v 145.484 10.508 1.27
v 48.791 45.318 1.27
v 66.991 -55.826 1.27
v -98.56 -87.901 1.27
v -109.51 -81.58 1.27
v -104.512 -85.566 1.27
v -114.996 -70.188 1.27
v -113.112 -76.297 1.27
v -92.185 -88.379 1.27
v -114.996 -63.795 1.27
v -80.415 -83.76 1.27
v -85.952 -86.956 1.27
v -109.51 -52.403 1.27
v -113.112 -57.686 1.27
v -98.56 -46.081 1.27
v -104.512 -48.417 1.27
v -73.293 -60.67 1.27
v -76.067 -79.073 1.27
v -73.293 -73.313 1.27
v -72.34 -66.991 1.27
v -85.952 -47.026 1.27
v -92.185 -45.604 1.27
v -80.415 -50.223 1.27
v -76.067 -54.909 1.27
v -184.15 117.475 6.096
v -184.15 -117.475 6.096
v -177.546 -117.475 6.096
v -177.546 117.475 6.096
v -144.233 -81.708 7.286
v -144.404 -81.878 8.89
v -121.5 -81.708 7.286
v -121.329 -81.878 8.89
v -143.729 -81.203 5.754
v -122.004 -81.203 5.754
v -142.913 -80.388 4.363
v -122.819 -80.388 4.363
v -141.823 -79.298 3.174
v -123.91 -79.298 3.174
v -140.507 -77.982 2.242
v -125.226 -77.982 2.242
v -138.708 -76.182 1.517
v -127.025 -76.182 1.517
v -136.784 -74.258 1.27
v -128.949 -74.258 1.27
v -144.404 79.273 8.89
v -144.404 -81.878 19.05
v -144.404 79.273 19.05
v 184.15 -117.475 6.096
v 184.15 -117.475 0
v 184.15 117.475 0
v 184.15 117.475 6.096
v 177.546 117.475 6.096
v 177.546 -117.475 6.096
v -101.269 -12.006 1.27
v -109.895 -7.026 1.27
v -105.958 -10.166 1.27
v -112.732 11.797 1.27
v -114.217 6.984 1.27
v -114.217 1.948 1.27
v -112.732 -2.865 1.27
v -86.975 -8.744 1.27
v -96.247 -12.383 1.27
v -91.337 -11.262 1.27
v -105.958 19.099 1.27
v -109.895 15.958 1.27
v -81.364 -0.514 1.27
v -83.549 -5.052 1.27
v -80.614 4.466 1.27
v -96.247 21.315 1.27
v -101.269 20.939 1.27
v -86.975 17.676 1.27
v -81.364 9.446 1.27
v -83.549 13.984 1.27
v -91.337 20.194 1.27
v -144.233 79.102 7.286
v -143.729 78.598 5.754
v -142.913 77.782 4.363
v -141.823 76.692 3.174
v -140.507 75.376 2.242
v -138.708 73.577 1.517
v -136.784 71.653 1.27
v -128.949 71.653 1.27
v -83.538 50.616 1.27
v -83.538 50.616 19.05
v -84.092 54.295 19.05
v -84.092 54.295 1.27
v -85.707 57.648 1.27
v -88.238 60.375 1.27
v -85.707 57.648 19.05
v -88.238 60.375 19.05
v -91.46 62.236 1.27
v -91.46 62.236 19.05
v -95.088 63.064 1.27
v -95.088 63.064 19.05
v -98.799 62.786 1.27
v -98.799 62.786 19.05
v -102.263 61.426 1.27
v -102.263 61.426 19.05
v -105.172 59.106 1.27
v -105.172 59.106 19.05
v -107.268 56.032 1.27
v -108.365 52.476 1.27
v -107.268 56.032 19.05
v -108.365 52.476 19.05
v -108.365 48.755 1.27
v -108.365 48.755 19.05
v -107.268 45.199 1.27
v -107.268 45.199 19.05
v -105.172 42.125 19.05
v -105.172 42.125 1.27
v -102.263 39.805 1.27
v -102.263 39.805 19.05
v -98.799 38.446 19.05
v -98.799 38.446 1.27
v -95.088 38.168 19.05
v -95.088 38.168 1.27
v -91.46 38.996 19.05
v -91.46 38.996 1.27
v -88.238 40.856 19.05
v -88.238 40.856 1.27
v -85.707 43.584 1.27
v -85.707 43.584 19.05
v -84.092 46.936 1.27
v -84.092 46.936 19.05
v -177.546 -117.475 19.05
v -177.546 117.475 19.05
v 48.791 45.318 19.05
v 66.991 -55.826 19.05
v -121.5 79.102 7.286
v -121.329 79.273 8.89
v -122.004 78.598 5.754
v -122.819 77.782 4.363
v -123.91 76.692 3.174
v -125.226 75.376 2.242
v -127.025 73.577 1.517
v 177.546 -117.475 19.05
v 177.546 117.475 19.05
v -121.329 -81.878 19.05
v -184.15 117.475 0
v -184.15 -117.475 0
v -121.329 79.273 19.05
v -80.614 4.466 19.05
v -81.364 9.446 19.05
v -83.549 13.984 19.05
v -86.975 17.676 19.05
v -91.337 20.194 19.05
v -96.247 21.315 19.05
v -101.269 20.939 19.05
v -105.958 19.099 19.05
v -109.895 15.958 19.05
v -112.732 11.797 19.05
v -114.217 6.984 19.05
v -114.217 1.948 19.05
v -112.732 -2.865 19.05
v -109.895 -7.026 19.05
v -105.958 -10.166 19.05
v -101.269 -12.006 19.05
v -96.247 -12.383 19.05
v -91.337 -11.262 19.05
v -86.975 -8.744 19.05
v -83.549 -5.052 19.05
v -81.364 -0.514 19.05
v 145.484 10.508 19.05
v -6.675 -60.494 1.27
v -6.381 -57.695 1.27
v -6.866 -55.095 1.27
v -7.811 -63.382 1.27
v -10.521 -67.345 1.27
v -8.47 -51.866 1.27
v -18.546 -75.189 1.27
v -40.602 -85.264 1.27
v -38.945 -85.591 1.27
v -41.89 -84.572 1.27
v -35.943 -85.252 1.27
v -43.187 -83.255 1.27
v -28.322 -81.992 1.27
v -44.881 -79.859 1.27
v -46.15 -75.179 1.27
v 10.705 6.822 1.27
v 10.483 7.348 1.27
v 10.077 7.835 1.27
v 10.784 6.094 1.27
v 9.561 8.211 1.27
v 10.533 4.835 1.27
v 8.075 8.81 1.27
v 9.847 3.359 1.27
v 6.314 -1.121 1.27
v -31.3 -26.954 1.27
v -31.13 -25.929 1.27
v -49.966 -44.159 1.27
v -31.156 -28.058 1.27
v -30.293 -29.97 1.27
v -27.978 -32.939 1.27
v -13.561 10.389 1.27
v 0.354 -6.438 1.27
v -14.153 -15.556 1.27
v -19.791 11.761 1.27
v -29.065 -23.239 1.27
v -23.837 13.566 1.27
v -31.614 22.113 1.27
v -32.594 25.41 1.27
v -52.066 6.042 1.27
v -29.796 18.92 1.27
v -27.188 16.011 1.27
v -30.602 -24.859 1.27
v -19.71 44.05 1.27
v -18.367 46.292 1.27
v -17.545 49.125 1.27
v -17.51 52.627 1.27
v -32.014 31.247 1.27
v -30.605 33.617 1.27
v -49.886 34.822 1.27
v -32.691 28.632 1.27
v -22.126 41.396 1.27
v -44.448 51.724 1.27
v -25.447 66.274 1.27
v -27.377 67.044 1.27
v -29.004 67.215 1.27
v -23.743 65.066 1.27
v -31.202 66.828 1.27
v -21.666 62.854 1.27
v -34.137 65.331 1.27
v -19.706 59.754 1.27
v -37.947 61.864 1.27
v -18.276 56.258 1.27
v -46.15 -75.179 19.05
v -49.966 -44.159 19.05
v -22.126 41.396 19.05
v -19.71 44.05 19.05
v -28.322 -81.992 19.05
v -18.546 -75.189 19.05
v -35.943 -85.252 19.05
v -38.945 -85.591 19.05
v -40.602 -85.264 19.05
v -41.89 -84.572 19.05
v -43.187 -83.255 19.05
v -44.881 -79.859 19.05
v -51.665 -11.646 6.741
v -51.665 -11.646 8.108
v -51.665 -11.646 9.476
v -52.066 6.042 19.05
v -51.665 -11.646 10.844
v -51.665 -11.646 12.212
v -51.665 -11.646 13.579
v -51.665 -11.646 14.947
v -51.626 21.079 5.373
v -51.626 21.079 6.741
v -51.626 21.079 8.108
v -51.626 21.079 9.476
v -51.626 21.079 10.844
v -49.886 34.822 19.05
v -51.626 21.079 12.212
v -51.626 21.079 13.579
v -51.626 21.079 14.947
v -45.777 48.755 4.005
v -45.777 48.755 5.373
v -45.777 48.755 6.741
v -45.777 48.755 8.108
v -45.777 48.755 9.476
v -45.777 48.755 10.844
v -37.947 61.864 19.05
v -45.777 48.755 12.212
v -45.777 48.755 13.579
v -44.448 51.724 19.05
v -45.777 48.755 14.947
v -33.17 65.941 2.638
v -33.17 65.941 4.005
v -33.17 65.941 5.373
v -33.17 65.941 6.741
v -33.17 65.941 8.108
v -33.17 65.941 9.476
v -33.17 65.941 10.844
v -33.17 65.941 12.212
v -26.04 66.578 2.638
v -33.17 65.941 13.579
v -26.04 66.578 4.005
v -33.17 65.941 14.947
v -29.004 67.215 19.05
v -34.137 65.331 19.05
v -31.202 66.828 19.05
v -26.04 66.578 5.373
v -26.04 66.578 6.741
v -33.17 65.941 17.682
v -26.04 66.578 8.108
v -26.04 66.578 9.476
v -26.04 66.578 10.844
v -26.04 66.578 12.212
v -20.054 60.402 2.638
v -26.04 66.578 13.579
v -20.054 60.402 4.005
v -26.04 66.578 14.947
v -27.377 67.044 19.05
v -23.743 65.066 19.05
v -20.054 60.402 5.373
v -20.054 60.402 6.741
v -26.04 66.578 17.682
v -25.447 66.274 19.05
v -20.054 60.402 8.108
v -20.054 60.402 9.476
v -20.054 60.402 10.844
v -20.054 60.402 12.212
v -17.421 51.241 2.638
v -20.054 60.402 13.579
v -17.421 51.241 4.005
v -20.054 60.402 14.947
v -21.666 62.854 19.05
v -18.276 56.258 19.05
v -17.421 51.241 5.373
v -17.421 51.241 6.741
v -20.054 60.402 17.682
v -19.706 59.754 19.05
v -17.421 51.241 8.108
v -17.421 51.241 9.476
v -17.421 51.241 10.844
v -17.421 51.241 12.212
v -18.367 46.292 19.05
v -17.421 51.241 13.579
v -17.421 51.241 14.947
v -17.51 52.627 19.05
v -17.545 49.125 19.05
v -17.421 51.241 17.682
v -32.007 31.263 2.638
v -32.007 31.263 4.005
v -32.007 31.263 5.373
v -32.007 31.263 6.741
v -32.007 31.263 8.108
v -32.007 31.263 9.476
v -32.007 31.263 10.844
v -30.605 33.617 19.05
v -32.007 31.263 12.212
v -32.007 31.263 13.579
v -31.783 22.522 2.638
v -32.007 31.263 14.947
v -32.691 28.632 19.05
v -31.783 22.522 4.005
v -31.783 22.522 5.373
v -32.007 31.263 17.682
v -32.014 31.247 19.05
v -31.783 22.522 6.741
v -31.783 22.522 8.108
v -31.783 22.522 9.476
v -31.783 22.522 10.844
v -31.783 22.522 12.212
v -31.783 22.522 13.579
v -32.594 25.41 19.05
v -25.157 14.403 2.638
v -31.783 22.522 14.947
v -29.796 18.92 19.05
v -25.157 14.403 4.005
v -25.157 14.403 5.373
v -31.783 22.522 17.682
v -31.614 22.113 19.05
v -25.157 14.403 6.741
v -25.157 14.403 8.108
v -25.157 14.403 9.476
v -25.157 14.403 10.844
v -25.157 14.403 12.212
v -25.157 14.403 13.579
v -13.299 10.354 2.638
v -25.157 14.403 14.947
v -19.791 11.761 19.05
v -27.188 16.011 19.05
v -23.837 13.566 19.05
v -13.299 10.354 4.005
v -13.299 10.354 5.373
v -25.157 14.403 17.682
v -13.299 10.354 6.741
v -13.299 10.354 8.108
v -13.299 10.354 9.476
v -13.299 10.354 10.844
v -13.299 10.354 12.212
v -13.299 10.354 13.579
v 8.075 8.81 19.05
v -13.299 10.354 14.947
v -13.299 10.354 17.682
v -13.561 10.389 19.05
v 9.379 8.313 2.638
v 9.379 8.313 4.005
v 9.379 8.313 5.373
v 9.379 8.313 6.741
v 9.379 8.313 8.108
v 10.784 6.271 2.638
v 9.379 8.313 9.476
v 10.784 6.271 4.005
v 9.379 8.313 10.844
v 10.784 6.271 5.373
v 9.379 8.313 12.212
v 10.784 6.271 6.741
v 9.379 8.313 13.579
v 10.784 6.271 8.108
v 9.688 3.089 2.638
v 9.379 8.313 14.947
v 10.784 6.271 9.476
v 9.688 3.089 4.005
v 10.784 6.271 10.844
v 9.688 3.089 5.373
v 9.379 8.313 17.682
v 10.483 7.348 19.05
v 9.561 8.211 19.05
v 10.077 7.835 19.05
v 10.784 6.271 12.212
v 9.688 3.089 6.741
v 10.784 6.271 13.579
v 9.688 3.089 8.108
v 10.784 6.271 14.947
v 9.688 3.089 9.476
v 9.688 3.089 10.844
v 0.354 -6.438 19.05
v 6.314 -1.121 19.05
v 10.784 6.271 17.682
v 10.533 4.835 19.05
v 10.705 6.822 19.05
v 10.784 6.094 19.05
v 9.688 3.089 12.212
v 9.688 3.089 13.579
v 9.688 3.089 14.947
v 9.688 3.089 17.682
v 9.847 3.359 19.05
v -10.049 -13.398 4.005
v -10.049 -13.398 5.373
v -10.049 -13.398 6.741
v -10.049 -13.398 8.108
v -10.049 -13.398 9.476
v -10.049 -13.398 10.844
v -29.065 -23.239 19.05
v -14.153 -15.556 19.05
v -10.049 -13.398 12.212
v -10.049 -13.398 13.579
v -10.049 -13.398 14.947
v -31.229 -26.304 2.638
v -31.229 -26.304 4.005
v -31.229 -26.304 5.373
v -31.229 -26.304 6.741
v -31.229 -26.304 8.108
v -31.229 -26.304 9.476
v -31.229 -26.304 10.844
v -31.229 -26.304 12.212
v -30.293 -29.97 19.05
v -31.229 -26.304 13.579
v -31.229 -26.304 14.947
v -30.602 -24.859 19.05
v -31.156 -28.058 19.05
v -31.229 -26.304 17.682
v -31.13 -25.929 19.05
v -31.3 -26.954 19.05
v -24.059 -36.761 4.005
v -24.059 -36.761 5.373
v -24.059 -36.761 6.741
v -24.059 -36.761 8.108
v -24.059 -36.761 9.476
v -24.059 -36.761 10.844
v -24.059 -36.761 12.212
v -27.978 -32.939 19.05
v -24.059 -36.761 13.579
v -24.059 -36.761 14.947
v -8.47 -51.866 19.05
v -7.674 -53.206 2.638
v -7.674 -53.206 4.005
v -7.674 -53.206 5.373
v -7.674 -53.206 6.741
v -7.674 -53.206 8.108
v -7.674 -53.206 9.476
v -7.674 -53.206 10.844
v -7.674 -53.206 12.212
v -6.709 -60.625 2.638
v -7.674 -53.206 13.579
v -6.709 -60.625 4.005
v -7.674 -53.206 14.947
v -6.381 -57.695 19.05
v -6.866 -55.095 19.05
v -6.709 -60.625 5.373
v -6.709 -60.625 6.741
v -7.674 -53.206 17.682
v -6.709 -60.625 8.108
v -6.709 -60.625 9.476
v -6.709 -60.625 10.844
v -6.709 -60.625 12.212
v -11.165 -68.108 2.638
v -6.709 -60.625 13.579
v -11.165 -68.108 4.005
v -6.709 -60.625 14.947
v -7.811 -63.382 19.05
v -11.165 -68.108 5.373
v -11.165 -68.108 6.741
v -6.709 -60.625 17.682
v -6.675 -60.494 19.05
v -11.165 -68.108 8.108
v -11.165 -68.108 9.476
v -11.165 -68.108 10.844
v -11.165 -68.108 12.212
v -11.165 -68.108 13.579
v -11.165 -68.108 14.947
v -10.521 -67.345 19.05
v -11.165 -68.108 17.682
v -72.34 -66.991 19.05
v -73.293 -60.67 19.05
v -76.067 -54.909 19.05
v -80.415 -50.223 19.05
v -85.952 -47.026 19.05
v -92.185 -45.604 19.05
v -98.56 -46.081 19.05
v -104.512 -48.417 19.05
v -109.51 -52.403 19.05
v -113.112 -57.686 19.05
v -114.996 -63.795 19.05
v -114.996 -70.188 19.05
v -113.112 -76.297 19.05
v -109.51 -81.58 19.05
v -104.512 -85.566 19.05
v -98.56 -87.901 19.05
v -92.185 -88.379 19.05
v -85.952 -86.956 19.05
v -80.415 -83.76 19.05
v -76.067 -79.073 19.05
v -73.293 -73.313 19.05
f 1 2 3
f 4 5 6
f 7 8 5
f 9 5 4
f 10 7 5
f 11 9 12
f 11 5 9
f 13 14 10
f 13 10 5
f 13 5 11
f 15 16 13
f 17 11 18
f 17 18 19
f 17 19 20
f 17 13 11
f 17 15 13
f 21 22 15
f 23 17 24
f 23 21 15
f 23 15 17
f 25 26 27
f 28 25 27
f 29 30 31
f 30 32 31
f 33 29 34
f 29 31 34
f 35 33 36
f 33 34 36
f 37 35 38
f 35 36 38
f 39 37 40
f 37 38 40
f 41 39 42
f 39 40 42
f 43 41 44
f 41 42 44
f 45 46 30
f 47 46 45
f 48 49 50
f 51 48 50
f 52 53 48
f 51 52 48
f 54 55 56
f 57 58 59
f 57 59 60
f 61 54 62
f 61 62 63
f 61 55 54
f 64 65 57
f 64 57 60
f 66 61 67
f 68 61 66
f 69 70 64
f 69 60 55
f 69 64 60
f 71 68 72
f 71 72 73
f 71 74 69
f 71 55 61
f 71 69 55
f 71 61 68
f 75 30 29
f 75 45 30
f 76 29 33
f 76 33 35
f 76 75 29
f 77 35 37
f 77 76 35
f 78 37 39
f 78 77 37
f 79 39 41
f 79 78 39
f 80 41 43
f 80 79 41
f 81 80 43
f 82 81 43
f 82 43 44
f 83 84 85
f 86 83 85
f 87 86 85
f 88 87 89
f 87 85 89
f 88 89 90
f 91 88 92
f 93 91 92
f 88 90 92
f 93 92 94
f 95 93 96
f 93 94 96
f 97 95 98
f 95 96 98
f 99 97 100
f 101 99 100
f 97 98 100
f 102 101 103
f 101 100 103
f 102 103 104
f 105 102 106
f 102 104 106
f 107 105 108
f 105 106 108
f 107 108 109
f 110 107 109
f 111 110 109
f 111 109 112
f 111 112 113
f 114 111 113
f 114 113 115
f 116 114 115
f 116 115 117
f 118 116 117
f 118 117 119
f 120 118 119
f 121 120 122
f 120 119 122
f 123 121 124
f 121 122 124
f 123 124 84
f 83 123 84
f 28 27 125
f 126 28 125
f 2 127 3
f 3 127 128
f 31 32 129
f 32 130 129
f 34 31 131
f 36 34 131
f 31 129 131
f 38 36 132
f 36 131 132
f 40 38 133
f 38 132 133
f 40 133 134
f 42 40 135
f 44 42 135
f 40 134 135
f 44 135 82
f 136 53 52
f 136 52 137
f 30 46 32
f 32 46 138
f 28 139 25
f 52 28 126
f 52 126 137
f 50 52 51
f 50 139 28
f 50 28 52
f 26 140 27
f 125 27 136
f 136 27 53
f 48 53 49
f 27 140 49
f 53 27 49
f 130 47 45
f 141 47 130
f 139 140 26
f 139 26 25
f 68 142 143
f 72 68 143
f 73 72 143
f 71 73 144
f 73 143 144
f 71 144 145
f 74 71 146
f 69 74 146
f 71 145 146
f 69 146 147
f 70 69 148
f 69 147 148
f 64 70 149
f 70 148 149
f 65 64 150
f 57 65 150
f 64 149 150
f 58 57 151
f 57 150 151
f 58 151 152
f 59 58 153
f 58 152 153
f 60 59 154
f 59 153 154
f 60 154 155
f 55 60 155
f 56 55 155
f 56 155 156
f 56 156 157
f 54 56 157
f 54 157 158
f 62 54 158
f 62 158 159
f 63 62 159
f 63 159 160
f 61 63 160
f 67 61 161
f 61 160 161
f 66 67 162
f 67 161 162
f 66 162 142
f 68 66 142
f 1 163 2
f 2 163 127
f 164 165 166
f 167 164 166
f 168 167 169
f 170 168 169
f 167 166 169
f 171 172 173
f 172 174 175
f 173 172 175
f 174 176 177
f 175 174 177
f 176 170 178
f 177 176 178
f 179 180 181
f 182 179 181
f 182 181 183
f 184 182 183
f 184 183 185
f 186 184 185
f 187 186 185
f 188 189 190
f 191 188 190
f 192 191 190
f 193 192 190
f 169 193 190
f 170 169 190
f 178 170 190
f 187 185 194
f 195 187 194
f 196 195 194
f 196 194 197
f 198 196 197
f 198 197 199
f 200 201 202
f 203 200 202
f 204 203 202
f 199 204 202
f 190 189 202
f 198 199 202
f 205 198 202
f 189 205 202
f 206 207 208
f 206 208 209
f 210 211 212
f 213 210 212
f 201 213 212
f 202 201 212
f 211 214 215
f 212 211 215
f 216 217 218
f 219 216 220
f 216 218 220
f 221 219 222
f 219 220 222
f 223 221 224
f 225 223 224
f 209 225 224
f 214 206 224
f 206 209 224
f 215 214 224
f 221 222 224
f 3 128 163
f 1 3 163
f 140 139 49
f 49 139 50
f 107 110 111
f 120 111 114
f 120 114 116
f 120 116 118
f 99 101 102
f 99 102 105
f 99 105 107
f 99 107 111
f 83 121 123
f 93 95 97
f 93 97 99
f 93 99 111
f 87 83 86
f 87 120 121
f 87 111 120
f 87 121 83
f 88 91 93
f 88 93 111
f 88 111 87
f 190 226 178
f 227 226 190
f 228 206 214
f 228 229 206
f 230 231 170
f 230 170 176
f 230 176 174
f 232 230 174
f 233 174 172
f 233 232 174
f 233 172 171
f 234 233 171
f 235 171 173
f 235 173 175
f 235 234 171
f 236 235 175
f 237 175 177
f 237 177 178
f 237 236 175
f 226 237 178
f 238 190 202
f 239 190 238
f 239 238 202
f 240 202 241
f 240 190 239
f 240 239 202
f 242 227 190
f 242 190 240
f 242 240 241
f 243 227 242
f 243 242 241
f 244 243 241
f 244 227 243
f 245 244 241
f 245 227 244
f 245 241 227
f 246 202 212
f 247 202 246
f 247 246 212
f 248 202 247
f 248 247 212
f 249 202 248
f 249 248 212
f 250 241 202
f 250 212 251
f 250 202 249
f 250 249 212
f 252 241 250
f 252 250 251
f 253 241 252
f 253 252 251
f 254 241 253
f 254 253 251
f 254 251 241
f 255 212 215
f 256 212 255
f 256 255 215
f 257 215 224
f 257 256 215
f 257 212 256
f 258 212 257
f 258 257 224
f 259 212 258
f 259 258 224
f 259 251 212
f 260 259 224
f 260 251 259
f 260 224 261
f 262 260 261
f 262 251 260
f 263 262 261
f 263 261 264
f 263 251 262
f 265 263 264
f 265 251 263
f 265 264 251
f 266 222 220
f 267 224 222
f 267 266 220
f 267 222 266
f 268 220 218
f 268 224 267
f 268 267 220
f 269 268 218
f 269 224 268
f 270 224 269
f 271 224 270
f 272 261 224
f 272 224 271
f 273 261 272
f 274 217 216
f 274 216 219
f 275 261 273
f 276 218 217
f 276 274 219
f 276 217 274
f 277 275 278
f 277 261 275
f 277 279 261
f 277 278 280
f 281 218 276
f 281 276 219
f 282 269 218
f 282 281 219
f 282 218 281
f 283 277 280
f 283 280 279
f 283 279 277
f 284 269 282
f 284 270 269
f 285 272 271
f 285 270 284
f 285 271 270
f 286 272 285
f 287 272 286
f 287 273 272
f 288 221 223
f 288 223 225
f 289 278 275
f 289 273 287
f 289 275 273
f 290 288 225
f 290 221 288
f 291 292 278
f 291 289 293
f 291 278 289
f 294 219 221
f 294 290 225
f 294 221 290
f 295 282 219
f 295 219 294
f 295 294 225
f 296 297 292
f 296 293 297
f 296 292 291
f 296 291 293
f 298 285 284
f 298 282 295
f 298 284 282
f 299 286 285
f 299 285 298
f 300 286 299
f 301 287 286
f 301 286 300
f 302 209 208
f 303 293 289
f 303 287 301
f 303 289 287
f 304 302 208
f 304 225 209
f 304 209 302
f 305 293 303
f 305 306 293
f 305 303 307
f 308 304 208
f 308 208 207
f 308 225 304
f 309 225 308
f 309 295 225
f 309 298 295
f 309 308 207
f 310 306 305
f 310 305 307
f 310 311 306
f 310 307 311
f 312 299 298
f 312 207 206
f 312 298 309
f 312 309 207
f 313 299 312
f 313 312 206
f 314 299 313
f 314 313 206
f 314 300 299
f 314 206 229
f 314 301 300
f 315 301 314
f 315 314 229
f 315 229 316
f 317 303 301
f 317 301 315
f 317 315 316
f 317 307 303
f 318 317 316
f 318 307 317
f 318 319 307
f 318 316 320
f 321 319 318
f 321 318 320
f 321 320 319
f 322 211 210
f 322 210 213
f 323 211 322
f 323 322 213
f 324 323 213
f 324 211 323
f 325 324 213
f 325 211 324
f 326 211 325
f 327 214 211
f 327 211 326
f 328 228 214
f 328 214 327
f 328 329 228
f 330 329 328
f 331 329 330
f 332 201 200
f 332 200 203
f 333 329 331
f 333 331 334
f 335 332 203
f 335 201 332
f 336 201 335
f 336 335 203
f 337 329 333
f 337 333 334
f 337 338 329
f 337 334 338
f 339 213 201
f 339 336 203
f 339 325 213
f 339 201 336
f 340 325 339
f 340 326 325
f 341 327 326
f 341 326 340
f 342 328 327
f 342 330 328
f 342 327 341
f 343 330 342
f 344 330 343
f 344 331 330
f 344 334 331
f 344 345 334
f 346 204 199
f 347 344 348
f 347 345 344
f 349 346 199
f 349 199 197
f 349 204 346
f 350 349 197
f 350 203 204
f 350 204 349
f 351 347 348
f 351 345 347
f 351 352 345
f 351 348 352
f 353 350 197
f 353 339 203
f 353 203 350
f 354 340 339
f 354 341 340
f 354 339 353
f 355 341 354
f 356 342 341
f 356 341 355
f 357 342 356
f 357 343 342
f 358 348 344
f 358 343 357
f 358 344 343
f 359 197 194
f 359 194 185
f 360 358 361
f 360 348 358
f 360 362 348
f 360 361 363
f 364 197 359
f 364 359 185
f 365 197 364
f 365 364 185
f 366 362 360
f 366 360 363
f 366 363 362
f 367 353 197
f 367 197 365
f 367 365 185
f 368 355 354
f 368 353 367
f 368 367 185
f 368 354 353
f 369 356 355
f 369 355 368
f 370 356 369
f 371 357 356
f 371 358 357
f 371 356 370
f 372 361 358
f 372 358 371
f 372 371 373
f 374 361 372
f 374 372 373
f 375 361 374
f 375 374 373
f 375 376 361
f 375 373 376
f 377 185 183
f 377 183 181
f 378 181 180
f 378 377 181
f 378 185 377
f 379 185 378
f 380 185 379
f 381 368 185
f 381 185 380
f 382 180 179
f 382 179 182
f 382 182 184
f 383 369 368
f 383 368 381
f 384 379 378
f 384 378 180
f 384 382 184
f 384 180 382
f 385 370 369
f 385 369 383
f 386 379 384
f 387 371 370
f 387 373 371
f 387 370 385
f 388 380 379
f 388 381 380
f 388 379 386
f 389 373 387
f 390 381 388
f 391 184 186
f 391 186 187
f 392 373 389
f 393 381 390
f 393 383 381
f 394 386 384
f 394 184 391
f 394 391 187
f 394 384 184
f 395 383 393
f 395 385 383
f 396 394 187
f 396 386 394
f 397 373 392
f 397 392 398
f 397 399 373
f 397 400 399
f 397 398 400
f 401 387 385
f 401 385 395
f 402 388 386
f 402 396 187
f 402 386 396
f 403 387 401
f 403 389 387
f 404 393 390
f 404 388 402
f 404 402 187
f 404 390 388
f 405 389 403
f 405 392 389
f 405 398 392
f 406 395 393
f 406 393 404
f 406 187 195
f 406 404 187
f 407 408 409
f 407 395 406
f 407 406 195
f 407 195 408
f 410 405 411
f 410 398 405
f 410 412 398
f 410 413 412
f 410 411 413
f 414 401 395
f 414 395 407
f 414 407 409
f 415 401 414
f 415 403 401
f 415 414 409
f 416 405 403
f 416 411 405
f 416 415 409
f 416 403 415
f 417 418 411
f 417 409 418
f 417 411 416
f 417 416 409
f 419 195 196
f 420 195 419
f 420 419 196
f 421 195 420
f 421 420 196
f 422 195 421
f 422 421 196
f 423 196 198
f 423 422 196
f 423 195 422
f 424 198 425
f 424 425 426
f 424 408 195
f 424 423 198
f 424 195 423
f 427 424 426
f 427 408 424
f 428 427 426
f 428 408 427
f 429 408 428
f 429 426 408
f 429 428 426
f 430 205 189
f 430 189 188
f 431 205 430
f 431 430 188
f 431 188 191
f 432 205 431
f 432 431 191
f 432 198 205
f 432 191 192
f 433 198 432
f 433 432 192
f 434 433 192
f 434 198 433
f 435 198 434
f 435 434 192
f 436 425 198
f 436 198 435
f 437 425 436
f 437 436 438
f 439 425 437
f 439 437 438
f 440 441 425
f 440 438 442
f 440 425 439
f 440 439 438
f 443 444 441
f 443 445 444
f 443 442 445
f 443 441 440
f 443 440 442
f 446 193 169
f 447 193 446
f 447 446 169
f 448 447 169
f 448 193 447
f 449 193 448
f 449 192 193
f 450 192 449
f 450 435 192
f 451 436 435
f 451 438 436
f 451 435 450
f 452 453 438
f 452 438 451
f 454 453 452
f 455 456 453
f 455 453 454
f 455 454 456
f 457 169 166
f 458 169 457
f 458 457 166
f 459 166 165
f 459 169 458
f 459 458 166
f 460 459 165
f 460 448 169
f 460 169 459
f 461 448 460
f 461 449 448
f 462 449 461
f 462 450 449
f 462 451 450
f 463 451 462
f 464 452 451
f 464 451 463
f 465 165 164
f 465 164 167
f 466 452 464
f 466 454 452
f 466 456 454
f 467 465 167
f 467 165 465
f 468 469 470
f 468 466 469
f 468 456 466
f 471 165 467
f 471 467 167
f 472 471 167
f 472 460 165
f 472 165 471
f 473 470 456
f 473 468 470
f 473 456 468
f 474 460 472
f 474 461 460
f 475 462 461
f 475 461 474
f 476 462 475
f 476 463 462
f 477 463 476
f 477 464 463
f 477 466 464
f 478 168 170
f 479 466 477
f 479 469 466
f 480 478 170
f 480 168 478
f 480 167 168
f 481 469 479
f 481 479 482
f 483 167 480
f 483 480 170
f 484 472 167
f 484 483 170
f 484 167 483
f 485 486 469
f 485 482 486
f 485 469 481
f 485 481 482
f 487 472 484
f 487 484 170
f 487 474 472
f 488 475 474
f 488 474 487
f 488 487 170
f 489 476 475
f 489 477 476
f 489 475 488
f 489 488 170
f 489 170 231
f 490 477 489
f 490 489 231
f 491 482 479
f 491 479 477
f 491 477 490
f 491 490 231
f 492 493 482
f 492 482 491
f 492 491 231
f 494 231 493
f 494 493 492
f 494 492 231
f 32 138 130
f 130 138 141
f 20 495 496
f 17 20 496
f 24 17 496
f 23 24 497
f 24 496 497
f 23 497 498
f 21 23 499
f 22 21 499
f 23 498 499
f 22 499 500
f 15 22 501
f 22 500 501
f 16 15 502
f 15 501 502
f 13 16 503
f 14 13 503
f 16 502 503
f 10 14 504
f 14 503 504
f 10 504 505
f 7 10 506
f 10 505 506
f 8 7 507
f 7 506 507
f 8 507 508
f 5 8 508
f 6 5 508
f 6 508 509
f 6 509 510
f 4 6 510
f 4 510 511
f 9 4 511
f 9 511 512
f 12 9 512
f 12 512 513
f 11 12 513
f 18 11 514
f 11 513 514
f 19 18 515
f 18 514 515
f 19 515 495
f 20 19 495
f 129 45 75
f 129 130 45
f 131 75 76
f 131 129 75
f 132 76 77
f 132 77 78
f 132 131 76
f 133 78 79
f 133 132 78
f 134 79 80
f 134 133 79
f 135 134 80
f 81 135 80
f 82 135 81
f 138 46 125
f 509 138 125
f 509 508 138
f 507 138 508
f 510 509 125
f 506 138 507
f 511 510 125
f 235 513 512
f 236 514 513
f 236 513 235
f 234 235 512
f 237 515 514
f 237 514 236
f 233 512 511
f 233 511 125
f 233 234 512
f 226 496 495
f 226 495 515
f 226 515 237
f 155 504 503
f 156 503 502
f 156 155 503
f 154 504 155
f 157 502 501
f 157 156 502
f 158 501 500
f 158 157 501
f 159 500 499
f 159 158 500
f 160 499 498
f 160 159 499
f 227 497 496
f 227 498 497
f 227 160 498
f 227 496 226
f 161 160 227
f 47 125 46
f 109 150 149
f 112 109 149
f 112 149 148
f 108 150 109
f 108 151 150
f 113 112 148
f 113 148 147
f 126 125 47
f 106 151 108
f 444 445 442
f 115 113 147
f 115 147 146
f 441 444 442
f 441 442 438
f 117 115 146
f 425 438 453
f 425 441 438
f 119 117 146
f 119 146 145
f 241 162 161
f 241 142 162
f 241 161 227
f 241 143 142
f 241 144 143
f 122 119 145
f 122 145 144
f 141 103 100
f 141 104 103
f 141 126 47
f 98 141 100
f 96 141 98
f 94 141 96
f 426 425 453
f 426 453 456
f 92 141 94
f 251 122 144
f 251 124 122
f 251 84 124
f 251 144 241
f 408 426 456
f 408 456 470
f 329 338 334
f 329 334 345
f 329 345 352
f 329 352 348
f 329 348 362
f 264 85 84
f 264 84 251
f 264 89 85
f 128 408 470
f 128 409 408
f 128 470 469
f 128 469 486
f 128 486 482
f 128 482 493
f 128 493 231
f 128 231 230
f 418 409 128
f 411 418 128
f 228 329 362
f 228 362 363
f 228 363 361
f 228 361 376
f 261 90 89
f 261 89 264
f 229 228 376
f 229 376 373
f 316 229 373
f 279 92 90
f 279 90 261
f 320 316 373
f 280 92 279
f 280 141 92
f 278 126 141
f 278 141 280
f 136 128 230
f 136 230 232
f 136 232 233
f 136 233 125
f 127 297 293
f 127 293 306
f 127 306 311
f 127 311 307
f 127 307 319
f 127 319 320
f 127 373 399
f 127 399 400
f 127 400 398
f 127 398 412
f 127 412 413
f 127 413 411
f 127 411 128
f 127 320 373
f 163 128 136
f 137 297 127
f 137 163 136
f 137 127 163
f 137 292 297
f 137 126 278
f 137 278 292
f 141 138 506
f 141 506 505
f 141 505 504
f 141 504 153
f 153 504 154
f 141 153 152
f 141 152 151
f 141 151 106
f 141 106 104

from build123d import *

# Parameters (mm, degrees)
F0_W      = 368.3
F0_H      = 234.95
F1_DEPTH  = 19.05
F2_W      = 6.604
F2_H      = 12.954
F3_DEPTH  = 234.951
F4_R      = 16.8960598702
F4_R_2    = 21.4477044948
F4_W      = 23.0748131871
F4_H      = 161.1514985561
F4_R_3    = 12.4831112704
F5_DEPTH  = 17.78
F6_R      = 7.62
F8_DEPTH  = 101.6
F14_DEPTH = 44.45


with BuildPart() as f1:
    # F0 (on Top) → F1 (new body)
    with BuildSketch(Plane.XY):
        Rectangle(F0_W, F0_H)
    extrude(amount=F1_DEPTH)

    # F2 (on face) → F3 (cut, through all)
    with BuildSketch(Plane.XZ.offset(117.475)):
        with Locations((180.848, 12.573)):
            Rectangle(F2_W, F2_H)
        with Locations((-180.848, 12.573)):
            Rectangle(F2_W, F2_H)
    extrude(amount=-F3_DEPTH, mode=Mode.SUBTRACT)

    # F4 (on face) → F5 (cut)
    with BuildSketch(Plane.XY.offset(19.05)):
        with BuildLine():
            add(Edge.make_bspline(
                [(-46.1496077478, -75.1792117953), (-49.3186279348, -60.6904518614), (-52.4598845595, -7.9087934106), (-52.5301794964, 45.6558860892), (-27.0101126446, 77.186916711), (-10.4710171081, 43.8396118699), (-38.9306329093, 34.1741312423), (-25.0554307802, 4.9086663528), (24.8994478008, 14.7435687242), (-9.0404651832, -16.7182072693), (-44.7013135767, -25.0884012199), (-2.5046643875, -50.5573295528), (-8.3693665776, -69.2660043872), (-40.33373303, -91.7806813493), (-44.7509198876, -81.5740125329), (-46.1496077478, -75.1792117953)],
                knots=[0, 0, 0, 0, 0.1157160493, 0.2250923254, 0.2979411693, 0.3640759595, 0.4304625959, 0.4971515908, 0.5778883555, 0.6550256298, 0.7270889253, 0.8092921071, 0.8674075577, 0.9489272318, 1, 1, 1, 1], degree=3))
        make_face()
        with Locations((-97.5096747279, 4.4660978019)):
            Circle(F4_R)
        with Locations((-93.7879234552, -66.9913738966)):
            Circle(F4_R_2)
        with Locations((-132.866229862, -1.3026073575)):
            Rectangle(F4_W, F4_H)
        with Locations((-96.0209742188, 50.6157167256)):
            Circle(F4_R_3)
        Polygon((145.4843993486, 10.5082045873), (48.7906520068, 45.3179564694), (66.9913962483, -55.8261610568), align=None)
    extrude(amount=-F5_DEPTH, mode=Mode.SUBTRACT)

    # F6
    f6_edges = [f1.edges().sort_by_distance(p)[0] for p in [
        (-144.403636, -1.302607, 1.27),
        (-132.86623, -81.878357, 1.27),
        (-121.328823, -1.302607, 1.27),
        (-132.86623, 79.273142, 1.27),
    ]]
    fillet(f6_edges, radius=F6_R)


with BuildPart() as f8:
    # F7 (on Right) → F8 (new body)
    with BuildSketch(Plane.YZ):
        Polygon((-12.7, 71.9454362988), (8.5887098685, 71.9454362988), (8.5887098685, 84.6454362988), (0, 84.6454362988), align=None)
        Polygon((-19.05, 71.9454362988), (-12.7, 71.9454362988), (0, 84.6454362988), (8.5887098685, 84.6454362988), (8.5887098685, 90.9954362988), (0, 90.9954362988), align=None)
    extrude(amount=F8_DEPTH)

    # F13 (on 3pt) → F14 (cut, symmetric)
    with BuildSketch(Plane.YZ.offset(50.8)):
        Polygon((0, 86.9807004929), (-17.2928925604, 70.0769647956), (10.7373492792, 68.7931329012), (10.095436126, 86.9807004929), align=None)
    extrude(amount=F14_DEPTH, both=True, mode=Mode.SUBTRACT)


with BuildPart() as f15_1:
    # F15: copy of F8
    add(f8.part)


solid = f1.part
